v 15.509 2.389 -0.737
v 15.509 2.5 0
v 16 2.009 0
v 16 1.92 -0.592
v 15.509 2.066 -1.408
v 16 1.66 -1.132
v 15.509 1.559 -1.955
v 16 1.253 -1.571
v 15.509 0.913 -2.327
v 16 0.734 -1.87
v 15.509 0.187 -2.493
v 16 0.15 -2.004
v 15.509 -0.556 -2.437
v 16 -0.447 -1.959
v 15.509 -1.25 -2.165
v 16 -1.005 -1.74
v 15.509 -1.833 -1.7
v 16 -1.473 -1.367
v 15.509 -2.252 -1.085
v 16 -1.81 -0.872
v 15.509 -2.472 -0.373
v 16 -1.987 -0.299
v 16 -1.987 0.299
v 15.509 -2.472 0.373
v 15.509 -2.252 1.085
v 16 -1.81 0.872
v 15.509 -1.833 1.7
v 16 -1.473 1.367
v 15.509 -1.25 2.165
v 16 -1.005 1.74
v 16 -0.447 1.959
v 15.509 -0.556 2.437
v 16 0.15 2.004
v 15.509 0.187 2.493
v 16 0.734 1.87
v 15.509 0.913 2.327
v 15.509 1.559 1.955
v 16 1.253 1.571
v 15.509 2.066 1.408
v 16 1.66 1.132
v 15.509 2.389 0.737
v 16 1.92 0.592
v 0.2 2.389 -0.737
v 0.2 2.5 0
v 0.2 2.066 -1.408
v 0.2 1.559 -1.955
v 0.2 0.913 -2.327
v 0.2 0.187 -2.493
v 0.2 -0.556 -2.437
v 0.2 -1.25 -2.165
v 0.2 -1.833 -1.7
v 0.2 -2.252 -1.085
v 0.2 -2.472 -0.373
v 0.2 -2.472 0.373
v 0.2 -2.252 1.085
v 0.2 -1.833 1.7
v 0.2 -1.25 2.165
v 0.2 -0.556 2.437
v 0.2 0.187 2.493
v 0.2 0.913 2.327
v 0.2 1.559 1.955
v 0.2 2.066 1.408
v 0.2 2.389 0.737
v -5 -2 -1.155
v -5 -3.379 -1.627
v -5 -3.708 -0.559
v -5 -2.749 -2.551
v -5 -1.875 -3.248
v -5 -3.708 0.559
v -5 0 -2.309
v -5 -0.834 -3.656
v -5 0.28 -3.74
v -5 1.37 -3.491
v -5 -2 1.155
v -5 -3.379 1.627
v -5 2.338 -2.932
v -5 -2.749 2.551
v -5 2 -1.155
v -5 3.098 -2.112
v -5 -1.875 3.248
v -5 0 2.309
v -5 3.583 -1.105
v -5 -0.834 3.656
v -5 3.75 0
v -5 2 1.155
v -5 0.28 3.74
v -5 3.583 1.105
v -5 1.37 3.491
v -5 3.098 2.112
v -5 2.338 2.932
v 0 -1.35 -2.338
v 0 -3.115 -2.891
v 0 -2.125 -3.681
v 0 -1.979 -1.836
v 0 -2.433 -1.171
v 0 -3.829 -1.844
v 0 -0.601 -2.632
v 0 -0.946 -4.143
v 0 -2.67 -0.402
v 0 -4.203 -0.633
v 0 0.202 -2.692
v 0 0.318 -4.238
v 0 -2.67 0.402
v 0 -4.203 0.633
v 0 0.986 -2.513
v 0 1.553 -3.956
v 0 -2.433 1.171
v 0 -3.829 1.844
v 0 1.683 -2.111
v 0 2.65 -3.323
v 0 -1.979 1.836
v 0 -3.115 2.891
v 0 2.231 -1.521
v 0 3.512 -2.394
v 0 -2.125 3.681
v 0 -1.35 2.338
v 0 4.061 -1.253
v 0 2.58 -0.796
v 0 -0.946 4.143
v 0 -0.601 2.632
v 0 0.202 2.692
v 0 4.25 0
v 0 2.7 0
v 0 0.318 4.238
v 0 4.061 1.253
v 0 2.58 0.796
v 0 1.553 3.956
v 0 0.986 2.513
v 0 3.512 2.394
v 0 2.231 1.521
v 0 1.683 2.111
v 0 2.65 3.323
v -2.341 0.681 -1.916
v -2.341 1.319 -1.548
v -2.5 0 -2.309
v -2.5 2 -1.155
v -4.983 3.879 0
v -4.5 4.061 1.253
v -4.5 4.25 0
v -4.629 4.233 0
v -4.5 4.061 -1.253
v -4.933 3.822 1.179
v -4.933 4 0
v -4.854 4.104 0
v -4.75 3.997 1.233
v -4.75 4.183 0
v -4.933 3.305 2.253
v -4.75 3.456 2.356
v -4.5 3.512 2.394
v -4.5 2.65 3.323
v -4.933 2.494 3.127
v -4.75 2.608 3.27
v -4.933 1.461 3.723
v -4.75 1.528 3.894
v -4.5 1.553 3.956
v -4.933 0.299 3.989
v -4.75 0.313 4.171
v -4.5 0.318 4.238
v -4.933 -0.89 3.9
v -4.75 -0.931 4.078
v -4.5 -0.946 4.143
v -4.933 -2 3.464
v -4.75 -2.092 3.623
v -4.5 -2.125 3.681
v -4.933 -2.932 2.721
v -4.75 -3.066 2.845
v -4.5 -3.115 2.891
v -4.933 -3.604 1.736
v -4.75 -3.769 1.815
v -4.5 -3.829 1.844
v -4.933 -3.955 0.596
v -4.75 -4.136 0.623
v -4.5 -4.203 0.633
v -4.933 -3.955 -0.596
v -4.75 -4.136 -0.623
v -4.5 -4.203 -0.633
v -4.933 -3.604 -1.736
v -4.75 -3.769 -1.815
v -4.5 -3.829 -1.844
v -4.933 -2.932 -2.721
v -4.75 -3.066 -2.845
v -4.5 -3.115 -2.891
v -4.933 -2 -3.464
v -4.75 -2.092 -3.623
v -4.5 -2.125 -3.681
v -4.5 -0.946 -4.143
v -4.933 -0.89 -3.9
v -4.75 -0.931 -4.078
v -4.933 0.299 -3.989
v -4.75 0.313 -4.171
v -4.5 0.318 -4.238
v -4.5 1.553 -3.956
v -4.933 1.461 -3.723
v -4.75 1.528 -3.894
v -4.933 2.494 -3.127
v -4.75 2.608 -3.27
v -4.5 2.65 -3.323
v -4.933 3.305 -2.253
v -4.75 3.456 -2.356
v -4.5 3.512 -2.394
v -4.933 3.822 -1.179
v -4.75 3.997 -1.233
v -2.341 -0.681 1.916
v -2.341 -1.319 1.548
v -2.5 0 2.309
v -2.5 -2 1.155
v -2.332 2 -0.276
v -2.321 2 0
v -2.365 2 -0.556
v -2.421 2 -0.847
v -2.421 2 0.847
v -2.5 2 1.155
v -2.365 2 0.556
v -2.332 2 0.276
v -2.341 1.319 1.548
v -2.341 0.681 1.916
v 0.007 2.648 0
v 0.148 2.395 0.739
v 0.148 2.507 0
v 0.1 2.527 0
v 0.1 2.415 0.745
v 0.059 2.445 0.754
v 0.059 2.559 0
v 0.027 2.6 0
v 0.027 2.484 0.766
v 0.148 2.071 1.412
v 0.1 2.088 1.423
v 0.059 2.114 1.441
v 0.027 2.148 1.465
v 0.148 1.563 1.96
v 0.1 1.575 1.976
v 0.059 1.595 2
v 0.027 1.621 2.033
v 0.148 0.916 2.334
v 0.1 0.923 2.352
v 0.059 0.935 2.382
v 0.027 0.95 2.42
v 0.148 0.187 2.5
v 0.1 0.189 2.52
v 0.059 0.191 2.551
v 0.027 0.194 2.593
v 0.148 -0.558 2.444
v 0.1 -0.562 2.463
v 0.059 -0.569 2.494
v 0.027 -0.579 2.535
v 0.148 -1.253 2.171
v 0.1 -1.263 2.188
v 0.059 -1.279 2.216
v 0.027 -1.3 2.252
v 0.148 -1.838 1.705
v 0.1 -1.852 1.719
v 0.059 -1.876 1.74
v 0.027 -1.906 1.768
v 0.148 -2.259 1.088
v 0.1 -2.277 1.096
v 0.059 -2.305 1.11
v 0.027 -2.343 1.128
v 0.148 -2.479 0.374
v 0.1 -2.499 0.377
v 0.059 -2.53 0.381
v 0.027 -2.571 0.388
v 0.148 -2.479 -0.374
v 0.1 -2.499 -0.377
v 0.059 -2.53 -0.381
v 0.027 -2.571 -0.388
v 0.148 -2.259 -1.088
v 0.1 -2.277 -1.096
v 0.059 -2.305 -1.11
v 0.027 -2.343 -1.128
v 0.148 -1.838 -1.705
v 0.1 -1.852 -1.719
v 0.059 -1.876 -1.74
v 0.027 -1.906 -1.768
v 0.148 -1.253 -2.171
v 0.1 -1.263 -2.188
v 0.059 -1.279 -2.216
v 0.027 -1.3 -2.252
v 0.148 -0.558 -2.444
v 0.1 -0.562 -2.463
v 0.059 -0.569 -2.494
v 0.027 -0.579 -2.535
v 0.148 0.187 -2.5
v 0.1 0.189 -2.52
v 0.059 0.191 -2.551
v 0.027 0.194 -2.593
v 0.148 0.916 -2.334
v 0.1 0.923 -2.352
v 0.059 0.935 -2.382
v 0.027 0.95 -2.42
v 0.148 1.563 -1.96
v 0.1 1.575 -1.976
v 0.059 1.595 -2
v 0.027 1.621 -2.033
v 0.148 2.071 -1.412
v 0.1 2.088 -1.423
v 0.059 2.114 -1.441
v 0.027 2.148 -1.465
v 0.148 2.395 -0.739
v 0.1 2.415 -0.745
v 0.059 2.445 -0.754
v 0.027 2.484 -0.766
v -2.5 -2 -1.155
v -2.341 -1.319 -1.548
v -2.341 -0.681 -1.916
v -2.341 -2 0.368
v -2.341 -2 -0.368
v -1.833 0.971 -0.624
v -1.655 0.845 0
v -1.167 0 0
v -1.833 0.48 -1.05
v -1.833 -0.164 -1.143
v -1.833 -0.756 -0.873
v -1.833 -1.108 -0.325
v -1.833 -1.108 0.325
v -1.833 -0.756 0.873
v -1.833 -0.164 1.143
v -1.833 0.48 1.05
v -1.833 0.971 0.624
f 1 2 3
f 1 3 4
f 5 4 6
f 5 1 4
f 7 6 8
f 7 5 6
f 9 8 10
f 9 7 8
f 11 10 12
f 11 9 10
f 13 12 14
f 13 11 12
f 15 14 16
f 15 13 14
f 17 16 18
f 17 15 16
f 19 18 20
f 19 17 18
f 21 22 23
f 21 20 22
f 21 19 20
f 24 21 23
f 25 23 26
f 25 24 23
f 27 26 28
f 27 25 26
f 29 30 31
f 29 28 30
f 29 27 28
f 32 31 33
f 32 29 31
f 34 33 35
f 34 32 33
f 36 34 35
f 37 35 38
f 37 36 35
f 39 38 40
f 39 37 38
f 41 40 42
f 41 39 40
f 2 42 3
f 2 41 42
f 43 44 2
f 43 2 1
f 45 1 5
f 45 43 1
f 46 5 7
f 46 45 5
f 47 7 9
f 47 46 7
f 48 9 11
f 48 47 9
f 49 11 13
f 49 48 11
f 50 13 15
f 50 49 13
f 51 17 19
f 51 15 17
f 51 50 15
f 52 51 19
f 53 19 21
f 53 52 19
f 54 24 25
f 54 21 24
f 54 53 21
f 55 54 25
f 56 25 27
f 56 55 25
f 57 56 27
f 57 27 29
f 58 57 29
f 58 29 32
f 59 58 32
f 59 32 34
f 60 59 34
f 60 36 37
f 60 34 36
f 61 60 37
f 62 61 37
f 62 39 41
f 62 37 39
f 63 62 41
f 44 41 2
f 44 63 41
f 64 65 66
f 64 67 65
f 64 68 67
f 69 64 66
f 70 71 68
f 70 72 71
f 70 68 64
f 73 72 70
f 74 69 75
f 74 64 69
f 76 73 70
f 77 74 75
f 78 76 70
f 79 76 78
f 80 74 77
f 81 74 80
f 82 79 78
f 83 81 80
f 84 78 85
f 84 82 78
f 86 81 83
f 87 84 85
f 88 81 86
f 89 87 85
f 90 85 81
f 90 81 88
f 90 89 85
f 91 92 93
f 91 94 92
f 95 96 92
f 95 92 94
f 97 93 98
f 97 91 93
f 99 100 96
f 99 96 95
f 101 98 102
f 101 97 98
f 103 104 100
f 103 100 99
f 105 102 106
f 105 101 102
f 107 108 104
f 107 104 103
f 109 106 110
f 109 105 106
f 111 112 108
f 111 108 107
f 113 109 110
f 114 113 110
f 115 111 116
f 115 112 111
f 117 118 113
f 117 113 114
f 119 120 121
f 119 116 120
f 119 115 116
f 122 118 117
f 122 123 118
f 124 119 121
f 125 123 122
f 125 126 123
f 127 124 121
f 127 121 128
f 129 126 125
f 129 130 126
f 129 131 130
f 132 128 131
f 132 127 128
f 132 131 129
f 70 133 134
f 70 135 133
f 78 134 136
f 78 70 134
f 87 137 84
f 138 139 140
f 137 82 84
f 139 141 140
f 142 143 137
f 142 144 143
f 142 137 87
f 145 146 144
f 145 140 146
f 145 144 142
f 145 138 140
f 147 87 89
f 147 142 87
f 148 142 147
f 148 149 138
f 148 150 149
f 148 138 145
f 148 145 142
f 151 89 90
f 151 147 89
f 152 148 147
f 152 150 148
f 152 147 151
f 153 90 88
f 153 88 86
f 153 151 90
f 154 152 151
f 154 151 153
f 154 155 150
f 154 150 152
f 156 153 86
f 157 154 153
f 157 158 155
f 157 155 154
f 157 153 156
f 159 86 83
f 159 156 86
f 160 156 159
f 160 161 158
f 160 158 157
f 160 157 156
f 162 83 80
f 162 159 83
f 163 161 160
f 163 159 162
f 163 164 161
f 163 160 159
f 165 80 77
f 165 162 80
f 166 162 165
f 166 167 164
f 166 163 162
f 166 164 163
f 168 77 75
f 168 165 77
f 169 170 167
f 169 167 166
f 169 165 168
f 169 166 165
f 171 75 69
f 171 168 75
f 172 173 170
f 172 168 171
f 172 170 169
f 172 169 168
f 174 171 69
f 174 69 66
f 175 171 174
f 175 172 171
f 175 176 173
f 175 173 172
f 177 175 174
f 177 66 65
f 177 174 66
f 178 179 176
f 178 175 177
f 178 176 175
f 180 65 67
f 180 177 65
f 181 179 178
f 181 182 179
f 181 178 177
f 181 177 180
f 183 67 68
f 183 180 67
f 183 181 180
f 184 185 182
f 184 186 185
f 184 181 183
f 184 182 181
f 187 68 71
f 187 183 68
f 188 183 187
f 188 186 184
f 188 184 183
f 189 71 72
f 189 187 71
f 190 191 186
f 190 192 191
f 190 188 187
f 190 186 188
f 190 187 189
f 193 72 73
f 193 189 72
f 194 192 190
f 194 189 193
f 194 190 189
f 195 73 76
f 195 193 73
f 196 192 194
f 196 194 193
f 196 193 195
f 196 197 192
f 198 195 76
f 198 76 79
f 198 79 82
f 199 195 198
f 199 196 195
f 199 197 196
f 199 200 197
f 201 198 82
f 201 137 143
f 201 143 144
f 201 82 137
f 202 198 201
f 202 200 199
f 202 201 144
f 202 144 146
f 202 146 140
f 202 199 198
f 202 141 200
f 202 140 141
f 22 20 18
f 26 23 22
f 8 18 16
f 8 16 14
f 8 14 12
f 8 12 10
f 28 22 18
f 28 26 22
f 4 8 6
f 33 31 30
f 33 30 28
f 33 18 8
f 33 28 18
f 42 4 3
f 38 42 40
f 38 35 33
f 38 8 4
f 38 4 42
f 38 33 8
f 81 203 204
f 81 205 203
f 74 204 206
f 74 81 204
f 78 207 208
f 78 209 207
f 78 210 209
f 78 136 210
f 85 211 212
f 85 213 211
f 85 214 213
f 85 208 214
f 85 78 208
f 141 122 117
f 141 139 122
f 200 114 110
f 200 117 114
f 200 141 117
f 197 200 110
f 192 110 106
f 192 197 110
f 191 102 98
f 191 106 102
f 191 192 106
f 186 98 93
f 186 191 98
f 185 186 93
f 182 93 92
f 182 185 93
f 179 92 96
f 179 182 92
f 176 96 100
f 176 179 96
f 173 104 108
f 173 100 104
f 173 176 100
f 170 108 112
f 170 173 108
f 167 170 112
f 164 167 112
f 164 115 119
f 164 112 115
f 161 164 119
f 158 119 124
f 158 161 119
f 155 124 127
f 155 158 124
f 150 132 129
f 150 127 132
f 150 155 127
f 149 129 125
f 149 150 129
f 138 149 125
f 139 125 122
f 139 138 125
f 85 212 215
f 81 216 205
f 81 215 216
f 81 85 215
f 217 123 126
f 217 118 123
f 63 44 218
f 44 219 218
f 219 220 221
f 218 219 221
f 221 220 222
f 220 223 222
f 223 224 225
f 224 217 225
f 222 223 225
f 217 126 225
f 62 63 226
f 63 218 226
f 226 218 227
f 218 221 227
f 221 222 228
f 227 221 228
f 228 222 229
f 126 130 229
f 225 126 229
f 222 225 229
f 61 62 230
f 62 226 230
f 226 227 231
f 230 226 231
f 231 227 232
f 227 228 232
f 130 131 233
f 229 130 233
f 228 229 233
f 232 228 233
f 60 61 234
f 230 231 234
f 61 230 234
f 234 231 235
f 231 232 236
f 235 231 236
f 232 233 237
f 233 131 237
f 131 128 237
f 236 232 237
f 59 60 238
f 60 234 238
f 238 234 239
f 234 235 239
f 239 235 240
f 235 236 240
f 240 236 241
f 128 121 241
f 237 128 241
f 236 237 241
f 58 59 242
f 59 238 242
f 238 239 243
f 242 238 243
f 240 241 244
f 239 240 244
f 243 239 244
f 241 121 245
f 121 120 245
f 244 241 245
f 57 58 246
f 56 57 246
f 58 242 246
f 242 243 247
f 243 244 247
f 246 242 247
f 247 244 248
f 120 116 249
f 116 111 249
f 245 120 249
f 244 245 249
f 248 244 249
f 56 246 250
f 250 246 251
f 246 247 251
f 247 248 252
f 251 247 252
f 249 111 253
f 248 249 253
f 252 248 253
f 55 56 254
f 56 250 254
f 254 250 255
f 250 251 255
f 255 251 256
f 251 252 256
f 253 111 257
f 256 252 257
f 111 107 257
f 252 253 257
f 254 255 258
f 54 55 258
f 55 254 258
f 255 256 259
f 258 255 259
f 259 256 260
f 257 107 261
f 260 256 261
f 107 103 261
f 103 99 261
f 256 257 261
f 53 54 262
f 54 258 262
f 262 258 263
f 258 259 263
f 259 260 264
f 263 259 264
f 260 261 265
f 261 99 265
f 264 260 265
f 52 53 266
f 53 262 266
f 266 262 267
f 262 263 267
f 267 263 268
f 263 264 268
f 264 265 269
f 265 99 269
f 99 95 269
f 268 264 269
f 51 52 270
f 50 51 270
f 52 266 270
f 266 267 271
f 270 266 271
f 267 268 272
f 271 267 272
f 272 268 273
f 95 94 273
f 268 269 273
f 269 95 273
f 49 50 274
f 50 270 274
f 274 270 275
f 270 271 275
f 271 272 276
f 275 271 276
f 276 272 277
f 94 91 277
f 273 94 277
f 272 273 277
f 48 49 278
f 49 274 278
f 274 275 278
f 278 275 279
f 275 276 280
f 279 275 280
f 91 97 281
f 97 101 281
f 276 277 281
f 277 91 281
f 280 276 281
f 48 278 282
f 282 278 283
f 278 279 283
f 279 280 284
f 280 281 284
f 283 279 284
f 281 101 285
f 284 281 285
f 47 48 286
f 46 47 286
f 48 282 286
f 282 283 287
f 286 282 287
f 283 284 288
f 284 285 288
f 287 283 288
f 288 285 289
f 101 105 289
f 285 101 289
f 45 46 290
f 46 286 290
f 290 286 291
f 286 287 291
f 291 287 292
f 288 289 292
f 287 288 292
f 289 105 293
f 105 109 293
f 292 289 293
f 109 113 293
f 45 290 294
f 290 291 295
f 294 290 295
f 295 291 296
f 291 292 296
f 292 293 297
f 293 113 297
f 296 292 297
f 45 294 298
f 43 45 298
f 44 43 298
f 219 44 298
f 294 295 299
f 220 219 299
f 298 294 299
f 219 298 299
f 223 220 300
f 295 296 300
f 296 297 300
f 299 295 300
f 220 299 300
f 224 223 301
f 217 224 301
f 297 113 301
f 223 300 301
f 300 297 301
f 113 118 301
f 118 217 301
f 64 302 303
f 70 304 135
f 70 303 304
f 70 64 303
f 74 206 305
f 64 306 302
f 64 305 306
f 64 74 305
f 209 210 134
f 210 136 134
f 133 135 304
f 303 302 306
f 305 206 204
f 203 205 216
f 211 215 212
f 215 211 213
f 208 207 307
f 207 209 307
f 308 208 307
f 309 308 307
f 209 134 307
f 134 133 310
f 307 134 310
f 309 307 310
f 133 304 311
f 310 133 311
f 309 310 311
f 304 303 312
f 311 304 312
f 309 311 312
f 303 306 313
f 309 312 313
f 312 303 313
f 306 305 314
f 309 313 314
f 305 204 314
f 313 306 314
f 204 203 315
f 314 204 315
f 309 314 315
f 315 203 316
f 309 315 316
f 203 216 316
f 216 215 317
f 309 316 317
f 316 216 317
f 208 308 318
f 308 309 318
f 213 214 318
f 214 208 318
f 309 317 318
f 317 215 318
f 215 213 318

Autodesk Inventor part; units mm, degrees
ref_plane "YZ Plane" through (0, 0, 0) normal (1, 0, 0) x (0, 1, 0)
ref_plane "XZ Plane" through (0, 0, 0) normal (0, 1, 0) x (-1, 0, 0)
sketch "Sketch1" plane through (0, 0, 0) normal (0, 0, 1) x (1, 0, 0)
  line L0 (-1.1667, 0) -> (16, 0)
  line L1 (16, 0) -> (16, 2.5)
  line L2 (16, 2.5) -> (0.8, 2.5)
  line L3 (0.8, 2.5) -> (0.3091, 2.5)
  line L4 (0.3091, 2.5) -> (0, 2.5)
  line L5 (0, 2.5) -> (0, 4.25)
  line L6 (0, 4.25) -> (-5, 4.25)
  line L7 (-5, 4.25) -> (-5, 2.3094)
  line L8 (-5, 2.3094) -> (-2.5, 2.3094)
  line L9 (-2.5, 2.3094) -> (-1.1667, 0)
  line L10 (-9.2, 0) -> (20.2, 0) projected
  line L11 (0, -0.85) -> (0, 5.1) projected
  line L12 (0.8, 2.5) -> (0, 2.5) construction
  dimension "d1" = 15.2
  dimension "d2" = 0.4909
  dimension "d3" = 5
  dimension "d4" = 2.5
  dimension "d5" = 60
  dimension "d6" = 5
  dimension "d7" = 5
  dimension "d8" = 4.6188
  dimension "d9" = 8.5
  dimension "d26" = 16
revolve "Body" add sketch "Sketch1" angle 360 about axis through (-1.1667, 0, 0) along (1, 0, 0)
sketch "Sketch2" plane through (-5, 0, 0) normal (-1, 0, 0) x (0, 0, 1)
  circle A0 centre (0, 0) radius 2.3094 projected
  line L0 (0, -5.95) -> (0, 5.95) projected
  line L1 (-5.95, 0) -> (5.95, 0) projected
  line L2 (2.3094, 0) -> (1.1547, -2)
  line L3 (1.1547, -2) -> (-1.1547, -2)
  line L4 (-1.1547, -2) -> (-2.3094, 0)
  line L5 (-2.3094, 0) -> (-1.1547, 2)
  line L6 (-1.1547, 2) -> (1.1547, 2)
  line L7 (1.1547, 2) -> (2.3094, 0)
extrude "Slot" add sketch "Sketch2" against normal up to next contours L7 A0 | A0 L2 | L6 L0 A0 | A0 L0 L3 | L0 L6 A0 | A0 L3 L0 | L4 A0 | A0 L5
fillet "Fillet1" radius 0.5 1 edges at (-5, -4.25, 0)
thread "Thread" size "M5x0.8" designation "M5" class "6g" standard "GB Metric profile" length 15.2
chamfer "Chamfer1" distance 0.4908 distance2 0.4908 1 edges at (16, -2.5, 0) measured on face at (16, -1.1374, -1.1324)
ref_plane "Work Plane1" through (29, 0, 0) normal (0, -1, 0) x (1, 0, 0)
fillet "Fillet2" radius 0.2 1 edges at (0, -2.5, 0)
equation "\"d1\" = GEL"
equation "\"d3\" = KOH"
equation "\"d4\" = INTI"
equation "\"d6\" = GD"
equation "\"d7\" = BDM"
equation "\"d8\" = 1.1547 * SW"
equation "\"d9\" = KOD"
equation "\"d26\" = NLG"
equation "\"d30\" = R"
equation "\"d17\" = RR"
equation "\"d13\" = GEL"
equation "\"d15\" = -0.5 * SPD + 0.5 * GD"
equation "\"d16\" = GUL"
equation "\"GD\" = NND"
equation "\"NLG\" = 16"
equation "\"GEL\" = 15.2"
equation "\"KOD\" = 8.5"
equation "\"KOH\" = NND"
equation "\"INTI\" = 2.5"
equation "\"GAL\" = 0.61345 * PTC"
equation "\"GUL\" = 0.61345 * PTC"
equation "\"BDM\" = NND"
equation "\"SW\" = 4"
equation "\"RR\" = 0.5"
equation "\"SPD\" = NND - 1.2269 * PTC"
equation "\"R\" = 0.2"
equation "\"TOA\" = 30deg"
equation "\"GD1\" = THREADDIA - 1.2269 * PTC"
equation "\"THREADDIA\" = 5"
equation "\"FAWI\" = 45deg"
equation "\"PTC\" = 0.8"
equation "\"NND\" = 5"
equation "\"E0\" = 1.155 * SW"
properties part number "Screw GB/T 70.1 M5 x 16(1)" material "Steel, Mild"
